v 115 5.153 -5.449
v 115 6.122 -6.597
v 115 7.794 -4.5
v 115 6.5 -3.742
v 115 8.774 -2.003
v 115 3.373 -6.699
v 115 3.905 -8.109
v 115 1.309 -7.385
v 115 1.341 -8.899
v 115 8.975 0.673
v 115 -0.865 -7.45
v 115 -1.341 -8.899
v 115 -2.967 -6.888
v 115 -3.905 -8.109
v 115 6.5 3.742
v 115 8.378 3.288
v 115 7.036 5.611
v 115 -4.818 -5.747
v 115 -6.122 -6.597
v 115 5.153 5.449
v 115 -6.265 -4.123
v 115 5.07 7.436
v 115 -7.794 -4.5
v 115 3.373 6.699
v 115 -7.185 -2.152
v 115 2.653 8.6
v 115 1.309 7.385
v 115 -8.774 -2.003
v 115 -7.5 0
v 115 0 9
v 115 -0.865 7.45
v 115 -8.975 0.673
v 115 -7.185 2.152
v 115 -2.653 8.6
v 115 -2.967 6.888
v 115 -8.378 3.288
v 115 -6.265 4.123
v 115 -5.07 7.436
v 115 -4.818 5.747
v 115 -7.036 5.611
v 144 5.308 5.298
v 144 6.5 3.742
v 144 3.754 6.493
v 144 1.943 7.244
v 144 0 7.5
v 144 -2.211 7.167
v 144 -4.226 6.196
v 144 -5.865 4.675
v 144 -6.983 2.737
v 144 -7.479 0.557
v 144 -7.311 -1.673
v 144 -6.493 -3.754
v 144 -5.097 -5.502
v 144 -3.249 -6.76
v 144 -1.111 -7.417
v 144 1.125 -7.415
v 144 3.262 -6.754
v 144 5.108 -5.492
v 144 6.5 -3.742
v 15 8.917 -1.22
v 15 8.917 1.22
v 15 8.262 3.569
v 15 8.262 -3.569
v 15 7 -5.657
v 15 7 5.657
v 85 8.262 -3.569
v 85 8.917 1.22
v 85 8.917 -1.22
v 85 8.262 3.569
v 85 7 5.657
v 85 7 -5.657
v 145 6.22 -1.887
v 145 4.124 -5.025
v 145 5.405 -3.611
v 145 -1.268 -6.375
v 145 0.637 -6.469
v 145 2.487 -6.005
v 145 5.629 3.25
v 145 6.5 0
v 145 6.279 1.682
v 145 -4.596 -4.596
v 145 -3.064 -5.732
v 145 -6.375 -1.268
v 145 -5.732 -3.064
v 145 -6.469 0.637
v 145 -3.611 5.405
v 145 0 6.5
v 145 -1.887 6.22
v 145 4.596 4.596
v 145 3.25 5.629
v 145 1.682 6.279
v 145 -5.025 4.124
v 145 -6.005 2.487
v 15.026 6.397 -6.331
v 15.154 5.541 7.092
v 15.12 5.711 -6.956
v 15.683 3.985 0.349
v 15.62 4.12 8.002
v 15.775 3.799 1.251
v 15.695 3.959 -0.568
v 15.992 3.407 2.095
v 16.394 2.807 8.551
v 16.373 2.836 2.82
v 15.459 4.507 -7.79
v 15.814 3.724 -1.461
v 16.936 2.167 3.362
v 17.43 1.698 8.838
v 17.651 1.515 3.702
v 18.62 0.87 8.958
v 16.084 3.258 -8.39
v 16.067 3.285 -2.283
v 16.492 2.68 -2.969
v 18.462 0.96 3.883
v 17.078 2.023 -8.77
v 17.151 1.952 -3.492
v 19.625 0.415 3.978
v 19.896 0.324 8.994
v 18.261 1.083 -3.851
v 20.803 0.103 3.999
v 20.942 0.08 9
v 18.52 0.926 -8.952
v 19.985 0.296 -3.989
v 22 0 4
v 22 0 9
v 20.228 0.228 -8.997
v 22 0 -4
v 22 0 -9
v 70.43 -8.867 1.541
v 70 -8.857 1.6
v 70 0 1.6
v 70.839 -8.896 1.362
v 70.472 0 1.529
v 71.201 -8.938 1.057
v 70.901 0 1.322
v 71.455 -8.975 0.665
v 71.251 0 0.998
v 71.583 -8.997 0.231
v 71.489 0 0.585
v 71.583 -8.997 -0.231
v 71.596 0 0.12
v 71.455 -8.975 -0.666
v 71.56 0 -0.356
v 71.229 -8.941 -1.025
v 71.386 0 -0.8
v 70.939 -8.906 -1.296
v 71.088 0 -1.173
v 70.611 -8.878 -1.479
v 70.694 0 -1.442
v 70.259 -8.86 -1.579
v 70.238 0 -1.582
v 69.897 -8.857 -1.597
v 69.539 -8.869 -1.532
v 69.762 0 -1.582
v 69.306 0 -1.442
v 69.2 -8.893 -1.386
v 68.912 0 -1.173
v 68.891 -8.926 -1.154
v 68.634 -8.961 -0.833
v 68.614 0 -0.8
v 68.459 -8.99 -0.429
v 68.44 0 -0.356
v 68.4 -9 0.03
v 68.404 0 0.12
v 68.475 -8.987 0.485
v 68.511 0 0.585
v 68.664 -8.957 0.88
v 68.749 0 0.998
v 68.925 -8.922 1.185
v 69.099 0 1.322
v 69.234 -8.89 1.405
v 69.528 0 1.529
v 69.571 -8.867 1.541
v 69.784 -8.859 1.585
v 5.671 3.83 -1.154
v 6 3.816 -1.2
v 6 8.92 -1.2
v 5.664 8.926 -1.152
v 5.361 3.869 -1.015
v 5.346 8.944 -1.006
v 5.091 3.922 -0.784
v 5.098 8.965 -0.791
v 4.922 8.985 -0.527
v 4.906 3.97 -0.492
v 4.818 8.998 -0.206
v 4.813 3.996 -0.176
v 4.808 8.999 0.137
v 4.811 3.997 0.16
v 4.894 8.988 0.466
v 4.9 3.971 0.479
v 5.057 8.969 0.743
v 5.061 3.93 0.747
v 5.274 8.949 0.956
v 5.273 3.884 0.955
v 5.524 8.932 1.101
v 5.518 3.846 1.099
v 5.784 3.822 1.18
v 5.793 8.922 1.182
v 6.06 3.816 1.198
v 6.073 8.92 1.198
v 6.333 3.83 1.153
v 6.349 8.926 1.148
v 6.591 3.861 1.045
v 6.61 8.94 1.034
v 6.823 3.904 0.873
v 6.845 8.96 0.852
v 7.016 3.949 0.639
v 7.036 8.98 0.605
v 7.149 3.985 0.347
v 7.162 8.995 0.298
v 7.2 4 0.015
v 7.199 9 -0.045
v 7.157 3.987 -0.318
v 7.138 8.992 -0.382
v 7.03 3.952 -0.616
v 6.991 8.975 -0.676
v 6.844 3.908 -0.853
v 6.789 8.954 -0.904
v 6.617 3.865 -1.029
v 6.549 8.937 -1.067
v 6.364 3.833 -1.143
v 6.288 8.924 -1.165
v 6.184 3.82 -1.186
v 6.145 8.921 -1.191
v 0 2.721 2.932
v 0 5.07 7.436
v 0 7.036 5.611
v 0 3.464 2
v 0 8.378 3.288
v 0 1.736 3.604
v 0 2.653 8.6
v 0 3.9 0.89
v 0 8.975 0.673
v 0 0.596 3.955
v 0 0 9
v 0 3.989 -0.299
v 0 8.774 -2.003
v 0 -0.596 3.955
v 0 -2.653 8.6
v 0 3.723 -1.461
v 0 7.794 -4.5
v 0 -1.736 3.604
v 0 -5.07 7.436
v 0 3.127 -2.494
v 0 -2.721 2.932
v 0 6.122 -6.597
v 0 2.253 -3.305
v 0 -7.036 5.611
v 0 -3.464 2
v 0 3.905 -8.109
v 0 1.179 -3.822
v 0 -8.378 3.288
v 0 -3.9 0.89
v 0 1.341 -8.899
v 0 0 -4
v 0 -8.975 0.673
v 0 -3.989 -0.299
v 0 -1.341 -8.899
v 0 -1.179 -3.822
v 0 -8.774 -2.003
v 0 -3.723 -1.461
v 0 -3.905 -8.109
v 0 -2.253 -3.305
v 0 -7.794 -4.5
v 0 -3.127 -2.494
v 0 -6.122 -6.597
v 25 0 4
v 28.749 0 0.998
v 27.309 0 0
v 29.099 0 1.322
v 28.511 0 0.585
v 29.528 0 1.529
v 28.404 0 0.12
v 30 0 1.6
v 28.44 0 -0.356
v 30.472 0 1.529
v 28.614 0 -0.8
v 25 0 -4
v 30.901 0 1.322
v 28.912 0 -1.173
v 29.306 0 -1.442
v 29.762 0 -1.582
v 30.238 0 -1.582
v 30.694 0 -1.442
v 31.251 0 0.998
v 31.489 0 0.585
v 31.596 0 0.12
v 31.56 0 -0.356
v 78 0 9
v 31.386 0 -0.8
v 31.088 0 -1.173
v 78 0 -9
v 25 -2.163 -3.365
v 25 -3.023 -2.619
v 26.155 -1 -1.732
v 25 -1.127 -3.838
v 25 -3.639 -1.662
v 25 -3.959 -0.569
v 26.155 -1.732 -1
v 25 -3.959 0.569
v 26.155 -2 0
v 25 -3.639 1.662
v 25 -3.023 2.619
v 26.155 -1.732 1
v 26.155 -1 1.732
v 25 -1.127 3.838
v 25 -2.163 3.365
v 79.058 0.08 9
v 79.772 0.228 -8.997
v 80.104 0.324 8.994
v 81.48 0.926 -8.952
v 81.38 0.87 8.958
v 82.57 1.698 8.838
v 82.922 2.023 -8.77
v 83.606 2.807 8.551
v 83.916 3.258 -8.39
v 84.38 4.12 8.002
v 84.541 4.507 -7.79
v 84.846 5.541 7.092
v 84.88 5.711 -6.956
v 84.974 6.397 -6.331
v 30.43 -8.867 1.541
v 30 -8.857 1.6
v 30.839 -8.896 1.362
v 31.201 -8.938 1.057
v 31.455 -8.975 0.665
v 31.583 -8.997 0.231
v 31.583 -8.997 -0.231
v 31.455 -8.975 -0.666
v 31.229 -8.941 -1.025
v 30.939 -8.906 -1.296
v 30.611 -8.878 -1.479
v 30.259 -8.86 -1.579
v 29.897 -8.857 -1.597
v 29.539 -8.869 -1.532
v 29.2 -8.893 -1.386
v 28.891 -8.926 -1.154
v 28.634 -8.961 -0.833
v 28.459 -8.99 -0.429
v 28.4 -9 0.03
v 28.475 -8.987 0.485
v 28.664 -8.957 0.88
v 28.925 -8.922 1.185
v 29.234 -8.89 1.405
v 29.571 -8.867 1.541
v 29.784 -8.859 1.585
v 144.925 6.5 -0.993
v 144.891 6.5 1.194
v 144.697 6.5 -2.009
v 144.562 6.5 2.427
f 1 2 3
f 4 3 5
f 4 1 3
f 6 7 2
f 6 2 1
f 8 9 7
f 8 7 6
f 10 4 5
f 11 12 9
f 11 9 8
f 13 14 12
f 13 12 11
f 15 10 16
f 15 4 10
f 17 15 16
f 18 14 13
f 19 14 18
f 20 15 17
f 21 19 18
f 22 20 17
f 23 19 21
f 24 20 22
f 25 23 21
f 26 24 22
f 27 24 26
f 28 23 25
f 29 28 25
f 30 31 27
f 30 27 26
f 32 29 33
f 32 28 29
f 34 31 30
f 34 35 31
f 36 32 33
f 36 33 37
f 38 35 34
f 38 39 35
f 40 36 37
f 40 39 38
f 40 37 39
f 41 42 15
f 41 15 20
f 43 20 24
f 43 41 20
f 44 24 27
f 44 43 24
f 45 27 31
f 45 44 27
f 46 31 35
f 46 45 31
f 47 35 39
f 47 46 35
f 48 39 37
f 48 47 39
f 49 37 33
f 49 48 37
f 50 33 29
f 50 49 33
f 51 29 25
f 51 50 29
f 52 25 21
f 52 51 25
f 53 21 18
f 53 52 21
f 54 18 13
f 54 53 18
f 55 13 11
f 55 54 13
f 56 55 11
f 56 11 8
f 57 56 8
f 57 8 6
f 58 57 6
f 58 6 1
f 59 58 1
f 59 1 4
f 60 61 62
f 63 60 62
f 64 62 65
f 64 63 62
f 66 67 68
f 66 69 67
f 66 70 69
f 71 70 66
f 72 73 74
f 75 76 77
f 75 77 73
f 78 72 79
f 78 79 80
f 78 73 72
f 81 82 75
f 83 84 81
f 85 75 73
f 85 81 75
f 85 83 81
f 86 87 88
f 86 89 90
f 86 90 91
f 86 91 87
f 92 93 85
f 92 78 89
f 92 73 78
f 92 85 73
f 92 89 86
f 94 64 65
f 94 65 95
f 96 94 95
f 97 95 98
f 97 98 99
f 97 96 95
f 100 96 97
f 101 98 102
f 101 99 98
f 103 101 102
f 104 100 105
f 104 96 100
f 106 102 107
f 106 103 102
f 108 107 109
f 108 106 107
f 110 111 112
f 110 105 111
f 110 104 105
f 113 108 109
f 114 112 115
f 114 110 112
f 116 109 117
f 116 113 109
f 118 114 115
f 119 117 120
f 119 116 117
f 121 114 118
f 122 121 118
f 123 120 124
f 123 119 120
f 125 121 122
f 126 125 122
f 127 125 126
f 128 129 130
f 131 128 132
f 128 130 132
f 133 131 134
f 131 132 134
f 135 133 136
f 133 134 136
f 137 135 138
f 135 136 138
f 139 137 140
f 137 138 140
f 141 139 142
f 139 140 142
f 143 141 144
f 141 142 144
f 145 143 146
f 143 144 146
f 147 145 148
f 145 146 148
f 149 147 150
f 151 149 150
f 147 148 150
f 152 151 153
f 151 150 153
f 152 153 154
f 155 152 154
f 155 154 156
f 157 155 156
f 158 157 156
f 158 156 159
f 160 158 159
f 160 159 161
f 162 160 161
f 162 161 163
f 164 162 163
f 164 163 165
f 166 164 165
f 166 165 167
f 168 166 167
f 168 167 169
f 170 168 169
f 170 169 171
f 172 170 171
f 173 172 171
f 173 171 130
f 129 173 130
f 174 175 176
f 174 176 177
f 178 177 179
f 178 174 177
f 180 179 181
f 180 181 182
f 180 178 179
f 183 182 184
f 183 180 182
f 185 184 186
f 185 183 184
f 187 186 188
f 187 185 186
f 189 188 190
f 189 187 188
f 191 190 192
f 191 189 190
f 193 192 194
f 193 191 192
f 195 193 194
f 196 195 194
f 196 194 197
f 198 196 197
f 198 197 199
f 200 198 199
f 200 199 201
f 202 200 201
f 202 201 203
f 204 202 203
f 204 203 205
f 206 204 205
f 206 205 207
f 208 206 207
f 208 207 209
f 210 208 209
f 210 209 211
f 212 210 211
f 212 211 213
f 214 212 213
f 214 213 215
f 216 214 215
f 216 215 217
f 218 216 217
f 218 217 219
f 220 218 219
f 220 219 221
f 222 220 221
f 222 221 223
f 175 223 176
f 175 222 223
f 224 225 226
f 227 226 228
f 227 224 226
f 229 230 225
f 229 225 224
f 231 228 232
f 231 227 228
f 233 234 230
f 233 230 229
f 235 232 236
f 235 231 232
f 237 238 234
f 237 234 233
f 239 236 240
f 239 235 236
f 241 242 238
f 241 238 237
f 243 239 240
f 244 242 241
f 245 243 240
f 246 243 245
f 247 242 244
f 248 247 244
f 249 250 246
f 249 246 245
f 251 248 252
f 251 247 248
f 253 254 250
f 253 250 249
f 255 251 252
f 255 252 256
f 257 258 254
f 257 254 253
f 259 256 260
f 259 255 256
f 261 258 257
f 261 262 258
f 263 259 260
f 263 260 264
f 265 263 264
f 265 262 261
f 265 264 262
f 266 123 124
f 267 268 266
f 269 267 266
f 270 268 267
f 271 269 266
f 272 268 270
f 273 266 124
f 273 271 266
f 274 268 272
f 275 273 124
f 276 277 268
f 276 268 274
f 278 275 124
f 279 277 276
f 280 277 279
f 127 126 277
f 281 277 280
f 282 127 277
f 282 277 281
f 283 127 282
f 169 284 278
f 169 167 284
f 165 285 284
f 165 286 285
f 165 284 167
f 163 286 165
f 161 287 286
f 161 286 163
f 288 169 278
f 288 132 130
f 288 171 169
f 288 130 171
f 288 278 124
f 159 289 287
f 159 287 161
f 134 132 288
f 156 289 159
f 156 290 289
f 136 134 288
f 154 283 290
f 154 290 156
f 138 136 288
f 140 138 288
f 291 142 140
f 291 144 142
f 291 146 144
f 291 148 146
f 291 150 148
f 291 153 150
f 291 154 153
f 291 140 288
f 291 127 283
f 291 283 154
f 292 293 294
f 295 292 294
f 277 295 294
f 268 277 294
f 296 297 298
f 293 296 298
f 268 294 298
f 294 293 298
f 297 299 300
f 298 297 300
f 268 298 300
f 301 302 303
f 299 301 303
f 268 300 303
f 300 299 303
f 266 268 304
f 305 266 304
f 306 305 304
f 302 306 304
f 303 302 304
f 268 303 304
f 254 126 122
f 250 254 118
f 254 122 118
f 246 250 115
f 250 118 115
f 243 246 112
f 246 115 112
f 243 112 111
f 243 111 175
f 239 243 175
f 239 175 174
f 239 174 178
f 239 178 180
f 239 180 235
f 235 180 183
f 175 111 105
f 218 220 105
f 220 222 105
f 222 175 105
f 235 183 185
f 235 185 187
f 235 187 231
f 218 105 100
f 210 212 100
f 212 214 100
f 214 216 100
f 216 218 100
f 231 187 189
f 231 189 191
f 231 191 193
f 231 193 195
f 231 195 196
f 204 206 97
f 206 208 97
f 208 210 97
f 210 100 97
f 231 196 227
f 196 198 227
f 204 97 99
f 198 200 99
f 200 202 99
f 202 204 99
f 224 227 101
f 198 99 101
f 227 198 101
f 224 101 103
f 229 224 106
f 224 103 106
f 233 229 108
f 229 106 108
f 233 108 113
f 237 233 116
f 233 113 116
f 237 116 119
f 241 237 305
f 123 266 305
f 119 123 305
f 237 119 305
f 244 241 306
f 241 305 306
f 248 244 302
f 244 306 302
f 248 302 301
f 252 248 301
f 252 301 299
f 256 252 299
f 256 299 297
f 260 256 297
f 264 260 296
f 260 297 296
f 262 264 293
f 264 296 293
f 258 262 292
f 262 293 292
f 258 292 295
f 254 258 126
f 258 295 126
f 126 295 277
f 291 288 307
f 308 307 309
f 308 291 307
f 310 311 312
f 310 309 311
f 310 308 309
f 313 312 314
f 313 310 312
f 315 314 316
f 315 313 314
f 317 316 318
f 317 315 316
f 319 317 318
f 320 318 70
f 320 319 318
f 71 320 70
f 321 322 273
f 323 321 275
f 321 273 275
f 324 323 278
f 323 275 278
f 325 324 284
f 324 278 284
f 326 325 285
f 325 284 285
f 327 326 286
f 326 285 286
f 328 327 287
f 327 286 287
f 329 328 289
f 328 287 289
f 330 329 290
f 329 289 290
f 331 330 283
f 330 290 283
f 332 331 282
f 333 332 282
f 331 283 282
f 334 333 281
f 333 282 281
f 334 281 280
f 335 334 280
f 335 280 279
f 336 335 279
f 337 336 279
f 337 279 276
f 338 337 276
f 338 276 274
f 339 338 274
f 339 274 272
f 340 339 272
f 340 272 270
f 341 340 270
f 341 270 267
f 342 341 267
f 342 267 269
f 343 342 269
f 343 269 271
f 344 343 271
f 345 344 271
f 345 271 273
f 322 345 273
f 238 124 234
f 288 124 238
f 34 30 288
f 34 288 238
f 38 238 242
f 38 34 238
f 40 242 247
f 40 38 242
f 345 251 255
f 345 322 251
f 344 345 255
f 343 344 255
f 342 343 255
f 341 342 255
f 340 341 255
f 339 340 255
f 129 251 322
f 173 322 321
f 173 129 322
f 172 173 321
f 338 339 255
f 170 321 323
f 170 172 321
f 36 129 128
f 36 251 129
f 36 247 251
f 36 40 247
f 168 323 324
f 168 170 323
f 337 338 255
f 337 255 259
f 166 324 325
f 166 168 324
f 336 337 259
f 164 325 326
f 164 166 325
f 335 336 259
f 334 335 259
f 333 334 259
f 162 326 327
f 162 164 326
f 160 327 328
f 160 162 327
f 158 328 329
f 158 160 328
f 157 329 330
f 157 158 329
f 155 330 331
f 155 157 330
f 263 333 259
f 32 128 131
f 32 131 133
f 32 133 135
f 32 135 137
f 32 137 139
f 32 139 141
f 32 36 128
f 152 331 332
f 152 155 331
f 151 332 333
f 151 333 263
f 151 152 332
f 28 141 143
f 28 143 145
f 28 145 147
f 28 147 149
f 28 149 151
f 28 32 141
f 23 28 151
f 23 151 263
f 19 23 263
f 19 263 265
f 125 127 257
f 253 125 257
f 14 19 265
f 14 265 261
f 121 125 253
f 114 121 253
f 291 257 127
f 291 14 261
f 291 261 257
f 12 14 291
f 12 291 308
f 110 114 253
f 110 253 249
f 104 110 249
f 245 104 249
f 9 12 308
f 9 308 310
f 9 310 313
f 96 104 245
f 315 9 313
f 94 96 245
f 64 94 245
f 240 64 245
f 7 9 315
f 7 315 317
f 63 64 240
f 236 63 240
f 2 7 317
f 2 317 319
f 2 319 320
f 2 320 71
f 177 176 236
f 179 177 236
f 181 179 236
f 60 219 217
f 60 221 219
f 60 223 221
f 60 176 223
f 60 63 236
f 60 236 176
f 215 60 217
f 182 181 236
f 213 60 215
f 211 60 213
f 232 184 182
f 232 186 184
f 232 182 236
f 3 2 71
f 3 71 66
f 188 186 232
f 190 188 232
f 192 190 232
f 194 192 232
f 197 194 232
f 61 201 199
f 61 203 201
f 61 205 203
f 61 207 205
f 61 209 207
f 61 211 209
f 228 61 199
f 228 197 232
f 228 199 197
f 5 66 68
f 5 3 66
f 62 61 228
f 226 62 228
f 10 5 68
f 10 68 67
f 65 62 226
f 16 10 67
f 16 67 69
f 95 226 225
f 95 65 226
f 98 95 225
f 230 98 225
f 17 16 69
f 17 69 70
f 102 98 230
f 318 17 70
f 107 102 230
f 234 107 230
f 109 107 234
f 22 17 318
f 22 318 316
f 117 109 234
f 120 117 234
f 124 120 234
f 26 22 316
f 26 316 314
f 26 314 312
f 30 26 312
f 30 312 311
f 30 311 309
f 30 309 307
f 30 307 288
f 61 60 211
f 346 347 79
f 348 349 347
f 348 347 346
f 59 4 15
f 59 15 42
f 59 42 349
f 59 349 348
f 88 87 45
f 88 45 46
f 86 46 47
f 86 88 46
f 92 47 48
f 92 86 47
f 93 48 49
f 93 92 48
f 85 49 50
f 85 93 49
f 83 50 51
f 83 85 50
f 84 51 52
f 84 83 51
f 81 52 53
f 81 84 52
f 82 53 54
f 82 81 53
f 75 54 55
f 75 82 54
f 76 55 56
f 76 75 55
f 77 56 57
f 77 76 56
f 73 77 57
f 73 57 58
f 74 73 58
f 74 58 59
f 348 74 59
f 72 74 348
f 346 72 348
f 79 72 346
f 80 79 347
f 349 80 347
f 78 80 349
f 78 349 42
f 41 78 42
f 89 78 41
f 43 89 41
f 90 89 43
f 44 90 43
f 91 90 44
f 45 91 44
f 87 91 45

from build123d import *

# Parameters (mm, degrees)
CHANFREIN1_SIZE              = 1
ENL_V_MAT_EXTRU_1_DEPTH      = 146.557548756
ENL_V_MAT_EXTRU_1_DEPTH_BACK = 146.557548756
ESQUISSE3_W                  = 30
ESQUISSE3_H                  = 1
PER_AGE1_D                   = 8
PER_AGE1_DEPTH               = 25
PER_AGE1_TIP                 = 2.309401077
ESQUISSE6_R                  = 1.6
ENL_V_MAT_EXTRU_2_DEPTH      = 146.557548769
R_P_TITION_LIN_AIRE1_COUNT   = 2
R_P_TITION_LIN_AIRE1_PITCH   = 40
ESQUISSE7_R                  = 1.2
ENL_V_MAT_EXTRU_3_DEPTH      = 146.557548771


with BuildPart() as part:
    # Esquisse1 → Base-Révolution (revolve)
    with BuildSketch(Plane.XY, mode=Mode.PRIVATE) as base_r_volution_sk:
        Polygon((0, 0), (0, 9), (115, 9), (115, 7.5), (145, 7.5), (145, 0), align=None)
    revolve(base_r_volution_sk.sketch.rotate(Axis((0, 0, 0), (1, 0, 0)), 90), axis=Axis((0, 0, 0), (1, 0, 0)))

    # Chanfrein1
    chanfrein1_edges = [part.edges().sort_by_distance(p)[0] for p in [
        (145, 0, -7.5),
    ]]
    chamfer(chanfrein1_edges, length=CHANFREIN1_SIZE)

    # Esquisse3 → Enlèv. mat.-Extru.1 (cut, two sides: drawn at the far end of the back side and taken through both)
    with BuildSketch(Plane.XY.offset(-ENL_V_MAT_EXTRU_1_DEPTH_BACK)):
        with Locations((130, 7)):
            Rectangle(ESQUISSE3_W, ESQUISSE3_H)
        with BuildLine():
            Line((85, 9), (15, 9))
            Line((15, 9), (15, 7))
            ThreePointArc((15, 7), (17.050252532, 2.050252532), (22, 0))
            Line((22, 0), (78, 0))
            ThreePointArc((78, 0), (82.949747468, 2.050252532), (85, 7))
            Line((85, 7), (85, 9))
        make_face()
    extrude(amount=ENL_V_MAT_EXTRU_1_DEPTH + ENL_V_MAT_EXTRU_1_DEPTH_BACK, mode=Mode.SUBTRACT)

    # Perçage1
    with Locations(Plane.ZY):
        with Locations((0, 0)):
            Hole(PER_AGE1_D / 2, depth=PER_AGE1_DEPTH)
            with Locations((0, 0, -(PER_AGE1_DEPTH + PER_AGE1_TIP / 2))):  # 120° drill point
                Cone(0, PER_AGE1_D / 2, PER_AGE1_TIP, mode=Mode.SUBTRACT)

    # Esquisse6 → Enlèv. mat.-Extru.2 (cut, through all)
    with BuildSketch(Plane(origin=(0, 0, 0), x_dir=(-1, 0, 0), z_dir=(0, 1, 0))):
        with Locations(Location((-30, 0, 0), (0, 0, 90))):
            Circle(ESQUISSE6_R)
    enl_v_mat_extru_2 = extrude(amount=-ENL_V_MAT_EXTRU_2_DEPTH, mode=Mode.SUBTRACT)

    # Répétition linéaire1: Enlèv. mat.-Extru.2 ×2
    with Locations(*[(i * R_P_TITION_LIN_AIRE1_PITCH, 0, 0) for i in range(1, R_P_TITION_LIN_AIRE1_COUNT)]):
        add(enl_v_mat_extru_2, mode=Mode.SUBTRACT)

    # Esquisse7 → Enlèv. mat.-Extru.3 (cut, through all)
    with BuildSketch(Plane(origin=(0, 0, 0), x_dir=(-1, 0, 0), z_dir=(0, 1, 0))):
        with Locations(Location((-6, 0, 0), (0, 0, 270))):
            Circle(ESQUISSE7_R)
    extrude(amount=ENL_V_MAT_EXTRU_3_DEPTH, mode=Mode.SUBTRACT)


solid = part.part
